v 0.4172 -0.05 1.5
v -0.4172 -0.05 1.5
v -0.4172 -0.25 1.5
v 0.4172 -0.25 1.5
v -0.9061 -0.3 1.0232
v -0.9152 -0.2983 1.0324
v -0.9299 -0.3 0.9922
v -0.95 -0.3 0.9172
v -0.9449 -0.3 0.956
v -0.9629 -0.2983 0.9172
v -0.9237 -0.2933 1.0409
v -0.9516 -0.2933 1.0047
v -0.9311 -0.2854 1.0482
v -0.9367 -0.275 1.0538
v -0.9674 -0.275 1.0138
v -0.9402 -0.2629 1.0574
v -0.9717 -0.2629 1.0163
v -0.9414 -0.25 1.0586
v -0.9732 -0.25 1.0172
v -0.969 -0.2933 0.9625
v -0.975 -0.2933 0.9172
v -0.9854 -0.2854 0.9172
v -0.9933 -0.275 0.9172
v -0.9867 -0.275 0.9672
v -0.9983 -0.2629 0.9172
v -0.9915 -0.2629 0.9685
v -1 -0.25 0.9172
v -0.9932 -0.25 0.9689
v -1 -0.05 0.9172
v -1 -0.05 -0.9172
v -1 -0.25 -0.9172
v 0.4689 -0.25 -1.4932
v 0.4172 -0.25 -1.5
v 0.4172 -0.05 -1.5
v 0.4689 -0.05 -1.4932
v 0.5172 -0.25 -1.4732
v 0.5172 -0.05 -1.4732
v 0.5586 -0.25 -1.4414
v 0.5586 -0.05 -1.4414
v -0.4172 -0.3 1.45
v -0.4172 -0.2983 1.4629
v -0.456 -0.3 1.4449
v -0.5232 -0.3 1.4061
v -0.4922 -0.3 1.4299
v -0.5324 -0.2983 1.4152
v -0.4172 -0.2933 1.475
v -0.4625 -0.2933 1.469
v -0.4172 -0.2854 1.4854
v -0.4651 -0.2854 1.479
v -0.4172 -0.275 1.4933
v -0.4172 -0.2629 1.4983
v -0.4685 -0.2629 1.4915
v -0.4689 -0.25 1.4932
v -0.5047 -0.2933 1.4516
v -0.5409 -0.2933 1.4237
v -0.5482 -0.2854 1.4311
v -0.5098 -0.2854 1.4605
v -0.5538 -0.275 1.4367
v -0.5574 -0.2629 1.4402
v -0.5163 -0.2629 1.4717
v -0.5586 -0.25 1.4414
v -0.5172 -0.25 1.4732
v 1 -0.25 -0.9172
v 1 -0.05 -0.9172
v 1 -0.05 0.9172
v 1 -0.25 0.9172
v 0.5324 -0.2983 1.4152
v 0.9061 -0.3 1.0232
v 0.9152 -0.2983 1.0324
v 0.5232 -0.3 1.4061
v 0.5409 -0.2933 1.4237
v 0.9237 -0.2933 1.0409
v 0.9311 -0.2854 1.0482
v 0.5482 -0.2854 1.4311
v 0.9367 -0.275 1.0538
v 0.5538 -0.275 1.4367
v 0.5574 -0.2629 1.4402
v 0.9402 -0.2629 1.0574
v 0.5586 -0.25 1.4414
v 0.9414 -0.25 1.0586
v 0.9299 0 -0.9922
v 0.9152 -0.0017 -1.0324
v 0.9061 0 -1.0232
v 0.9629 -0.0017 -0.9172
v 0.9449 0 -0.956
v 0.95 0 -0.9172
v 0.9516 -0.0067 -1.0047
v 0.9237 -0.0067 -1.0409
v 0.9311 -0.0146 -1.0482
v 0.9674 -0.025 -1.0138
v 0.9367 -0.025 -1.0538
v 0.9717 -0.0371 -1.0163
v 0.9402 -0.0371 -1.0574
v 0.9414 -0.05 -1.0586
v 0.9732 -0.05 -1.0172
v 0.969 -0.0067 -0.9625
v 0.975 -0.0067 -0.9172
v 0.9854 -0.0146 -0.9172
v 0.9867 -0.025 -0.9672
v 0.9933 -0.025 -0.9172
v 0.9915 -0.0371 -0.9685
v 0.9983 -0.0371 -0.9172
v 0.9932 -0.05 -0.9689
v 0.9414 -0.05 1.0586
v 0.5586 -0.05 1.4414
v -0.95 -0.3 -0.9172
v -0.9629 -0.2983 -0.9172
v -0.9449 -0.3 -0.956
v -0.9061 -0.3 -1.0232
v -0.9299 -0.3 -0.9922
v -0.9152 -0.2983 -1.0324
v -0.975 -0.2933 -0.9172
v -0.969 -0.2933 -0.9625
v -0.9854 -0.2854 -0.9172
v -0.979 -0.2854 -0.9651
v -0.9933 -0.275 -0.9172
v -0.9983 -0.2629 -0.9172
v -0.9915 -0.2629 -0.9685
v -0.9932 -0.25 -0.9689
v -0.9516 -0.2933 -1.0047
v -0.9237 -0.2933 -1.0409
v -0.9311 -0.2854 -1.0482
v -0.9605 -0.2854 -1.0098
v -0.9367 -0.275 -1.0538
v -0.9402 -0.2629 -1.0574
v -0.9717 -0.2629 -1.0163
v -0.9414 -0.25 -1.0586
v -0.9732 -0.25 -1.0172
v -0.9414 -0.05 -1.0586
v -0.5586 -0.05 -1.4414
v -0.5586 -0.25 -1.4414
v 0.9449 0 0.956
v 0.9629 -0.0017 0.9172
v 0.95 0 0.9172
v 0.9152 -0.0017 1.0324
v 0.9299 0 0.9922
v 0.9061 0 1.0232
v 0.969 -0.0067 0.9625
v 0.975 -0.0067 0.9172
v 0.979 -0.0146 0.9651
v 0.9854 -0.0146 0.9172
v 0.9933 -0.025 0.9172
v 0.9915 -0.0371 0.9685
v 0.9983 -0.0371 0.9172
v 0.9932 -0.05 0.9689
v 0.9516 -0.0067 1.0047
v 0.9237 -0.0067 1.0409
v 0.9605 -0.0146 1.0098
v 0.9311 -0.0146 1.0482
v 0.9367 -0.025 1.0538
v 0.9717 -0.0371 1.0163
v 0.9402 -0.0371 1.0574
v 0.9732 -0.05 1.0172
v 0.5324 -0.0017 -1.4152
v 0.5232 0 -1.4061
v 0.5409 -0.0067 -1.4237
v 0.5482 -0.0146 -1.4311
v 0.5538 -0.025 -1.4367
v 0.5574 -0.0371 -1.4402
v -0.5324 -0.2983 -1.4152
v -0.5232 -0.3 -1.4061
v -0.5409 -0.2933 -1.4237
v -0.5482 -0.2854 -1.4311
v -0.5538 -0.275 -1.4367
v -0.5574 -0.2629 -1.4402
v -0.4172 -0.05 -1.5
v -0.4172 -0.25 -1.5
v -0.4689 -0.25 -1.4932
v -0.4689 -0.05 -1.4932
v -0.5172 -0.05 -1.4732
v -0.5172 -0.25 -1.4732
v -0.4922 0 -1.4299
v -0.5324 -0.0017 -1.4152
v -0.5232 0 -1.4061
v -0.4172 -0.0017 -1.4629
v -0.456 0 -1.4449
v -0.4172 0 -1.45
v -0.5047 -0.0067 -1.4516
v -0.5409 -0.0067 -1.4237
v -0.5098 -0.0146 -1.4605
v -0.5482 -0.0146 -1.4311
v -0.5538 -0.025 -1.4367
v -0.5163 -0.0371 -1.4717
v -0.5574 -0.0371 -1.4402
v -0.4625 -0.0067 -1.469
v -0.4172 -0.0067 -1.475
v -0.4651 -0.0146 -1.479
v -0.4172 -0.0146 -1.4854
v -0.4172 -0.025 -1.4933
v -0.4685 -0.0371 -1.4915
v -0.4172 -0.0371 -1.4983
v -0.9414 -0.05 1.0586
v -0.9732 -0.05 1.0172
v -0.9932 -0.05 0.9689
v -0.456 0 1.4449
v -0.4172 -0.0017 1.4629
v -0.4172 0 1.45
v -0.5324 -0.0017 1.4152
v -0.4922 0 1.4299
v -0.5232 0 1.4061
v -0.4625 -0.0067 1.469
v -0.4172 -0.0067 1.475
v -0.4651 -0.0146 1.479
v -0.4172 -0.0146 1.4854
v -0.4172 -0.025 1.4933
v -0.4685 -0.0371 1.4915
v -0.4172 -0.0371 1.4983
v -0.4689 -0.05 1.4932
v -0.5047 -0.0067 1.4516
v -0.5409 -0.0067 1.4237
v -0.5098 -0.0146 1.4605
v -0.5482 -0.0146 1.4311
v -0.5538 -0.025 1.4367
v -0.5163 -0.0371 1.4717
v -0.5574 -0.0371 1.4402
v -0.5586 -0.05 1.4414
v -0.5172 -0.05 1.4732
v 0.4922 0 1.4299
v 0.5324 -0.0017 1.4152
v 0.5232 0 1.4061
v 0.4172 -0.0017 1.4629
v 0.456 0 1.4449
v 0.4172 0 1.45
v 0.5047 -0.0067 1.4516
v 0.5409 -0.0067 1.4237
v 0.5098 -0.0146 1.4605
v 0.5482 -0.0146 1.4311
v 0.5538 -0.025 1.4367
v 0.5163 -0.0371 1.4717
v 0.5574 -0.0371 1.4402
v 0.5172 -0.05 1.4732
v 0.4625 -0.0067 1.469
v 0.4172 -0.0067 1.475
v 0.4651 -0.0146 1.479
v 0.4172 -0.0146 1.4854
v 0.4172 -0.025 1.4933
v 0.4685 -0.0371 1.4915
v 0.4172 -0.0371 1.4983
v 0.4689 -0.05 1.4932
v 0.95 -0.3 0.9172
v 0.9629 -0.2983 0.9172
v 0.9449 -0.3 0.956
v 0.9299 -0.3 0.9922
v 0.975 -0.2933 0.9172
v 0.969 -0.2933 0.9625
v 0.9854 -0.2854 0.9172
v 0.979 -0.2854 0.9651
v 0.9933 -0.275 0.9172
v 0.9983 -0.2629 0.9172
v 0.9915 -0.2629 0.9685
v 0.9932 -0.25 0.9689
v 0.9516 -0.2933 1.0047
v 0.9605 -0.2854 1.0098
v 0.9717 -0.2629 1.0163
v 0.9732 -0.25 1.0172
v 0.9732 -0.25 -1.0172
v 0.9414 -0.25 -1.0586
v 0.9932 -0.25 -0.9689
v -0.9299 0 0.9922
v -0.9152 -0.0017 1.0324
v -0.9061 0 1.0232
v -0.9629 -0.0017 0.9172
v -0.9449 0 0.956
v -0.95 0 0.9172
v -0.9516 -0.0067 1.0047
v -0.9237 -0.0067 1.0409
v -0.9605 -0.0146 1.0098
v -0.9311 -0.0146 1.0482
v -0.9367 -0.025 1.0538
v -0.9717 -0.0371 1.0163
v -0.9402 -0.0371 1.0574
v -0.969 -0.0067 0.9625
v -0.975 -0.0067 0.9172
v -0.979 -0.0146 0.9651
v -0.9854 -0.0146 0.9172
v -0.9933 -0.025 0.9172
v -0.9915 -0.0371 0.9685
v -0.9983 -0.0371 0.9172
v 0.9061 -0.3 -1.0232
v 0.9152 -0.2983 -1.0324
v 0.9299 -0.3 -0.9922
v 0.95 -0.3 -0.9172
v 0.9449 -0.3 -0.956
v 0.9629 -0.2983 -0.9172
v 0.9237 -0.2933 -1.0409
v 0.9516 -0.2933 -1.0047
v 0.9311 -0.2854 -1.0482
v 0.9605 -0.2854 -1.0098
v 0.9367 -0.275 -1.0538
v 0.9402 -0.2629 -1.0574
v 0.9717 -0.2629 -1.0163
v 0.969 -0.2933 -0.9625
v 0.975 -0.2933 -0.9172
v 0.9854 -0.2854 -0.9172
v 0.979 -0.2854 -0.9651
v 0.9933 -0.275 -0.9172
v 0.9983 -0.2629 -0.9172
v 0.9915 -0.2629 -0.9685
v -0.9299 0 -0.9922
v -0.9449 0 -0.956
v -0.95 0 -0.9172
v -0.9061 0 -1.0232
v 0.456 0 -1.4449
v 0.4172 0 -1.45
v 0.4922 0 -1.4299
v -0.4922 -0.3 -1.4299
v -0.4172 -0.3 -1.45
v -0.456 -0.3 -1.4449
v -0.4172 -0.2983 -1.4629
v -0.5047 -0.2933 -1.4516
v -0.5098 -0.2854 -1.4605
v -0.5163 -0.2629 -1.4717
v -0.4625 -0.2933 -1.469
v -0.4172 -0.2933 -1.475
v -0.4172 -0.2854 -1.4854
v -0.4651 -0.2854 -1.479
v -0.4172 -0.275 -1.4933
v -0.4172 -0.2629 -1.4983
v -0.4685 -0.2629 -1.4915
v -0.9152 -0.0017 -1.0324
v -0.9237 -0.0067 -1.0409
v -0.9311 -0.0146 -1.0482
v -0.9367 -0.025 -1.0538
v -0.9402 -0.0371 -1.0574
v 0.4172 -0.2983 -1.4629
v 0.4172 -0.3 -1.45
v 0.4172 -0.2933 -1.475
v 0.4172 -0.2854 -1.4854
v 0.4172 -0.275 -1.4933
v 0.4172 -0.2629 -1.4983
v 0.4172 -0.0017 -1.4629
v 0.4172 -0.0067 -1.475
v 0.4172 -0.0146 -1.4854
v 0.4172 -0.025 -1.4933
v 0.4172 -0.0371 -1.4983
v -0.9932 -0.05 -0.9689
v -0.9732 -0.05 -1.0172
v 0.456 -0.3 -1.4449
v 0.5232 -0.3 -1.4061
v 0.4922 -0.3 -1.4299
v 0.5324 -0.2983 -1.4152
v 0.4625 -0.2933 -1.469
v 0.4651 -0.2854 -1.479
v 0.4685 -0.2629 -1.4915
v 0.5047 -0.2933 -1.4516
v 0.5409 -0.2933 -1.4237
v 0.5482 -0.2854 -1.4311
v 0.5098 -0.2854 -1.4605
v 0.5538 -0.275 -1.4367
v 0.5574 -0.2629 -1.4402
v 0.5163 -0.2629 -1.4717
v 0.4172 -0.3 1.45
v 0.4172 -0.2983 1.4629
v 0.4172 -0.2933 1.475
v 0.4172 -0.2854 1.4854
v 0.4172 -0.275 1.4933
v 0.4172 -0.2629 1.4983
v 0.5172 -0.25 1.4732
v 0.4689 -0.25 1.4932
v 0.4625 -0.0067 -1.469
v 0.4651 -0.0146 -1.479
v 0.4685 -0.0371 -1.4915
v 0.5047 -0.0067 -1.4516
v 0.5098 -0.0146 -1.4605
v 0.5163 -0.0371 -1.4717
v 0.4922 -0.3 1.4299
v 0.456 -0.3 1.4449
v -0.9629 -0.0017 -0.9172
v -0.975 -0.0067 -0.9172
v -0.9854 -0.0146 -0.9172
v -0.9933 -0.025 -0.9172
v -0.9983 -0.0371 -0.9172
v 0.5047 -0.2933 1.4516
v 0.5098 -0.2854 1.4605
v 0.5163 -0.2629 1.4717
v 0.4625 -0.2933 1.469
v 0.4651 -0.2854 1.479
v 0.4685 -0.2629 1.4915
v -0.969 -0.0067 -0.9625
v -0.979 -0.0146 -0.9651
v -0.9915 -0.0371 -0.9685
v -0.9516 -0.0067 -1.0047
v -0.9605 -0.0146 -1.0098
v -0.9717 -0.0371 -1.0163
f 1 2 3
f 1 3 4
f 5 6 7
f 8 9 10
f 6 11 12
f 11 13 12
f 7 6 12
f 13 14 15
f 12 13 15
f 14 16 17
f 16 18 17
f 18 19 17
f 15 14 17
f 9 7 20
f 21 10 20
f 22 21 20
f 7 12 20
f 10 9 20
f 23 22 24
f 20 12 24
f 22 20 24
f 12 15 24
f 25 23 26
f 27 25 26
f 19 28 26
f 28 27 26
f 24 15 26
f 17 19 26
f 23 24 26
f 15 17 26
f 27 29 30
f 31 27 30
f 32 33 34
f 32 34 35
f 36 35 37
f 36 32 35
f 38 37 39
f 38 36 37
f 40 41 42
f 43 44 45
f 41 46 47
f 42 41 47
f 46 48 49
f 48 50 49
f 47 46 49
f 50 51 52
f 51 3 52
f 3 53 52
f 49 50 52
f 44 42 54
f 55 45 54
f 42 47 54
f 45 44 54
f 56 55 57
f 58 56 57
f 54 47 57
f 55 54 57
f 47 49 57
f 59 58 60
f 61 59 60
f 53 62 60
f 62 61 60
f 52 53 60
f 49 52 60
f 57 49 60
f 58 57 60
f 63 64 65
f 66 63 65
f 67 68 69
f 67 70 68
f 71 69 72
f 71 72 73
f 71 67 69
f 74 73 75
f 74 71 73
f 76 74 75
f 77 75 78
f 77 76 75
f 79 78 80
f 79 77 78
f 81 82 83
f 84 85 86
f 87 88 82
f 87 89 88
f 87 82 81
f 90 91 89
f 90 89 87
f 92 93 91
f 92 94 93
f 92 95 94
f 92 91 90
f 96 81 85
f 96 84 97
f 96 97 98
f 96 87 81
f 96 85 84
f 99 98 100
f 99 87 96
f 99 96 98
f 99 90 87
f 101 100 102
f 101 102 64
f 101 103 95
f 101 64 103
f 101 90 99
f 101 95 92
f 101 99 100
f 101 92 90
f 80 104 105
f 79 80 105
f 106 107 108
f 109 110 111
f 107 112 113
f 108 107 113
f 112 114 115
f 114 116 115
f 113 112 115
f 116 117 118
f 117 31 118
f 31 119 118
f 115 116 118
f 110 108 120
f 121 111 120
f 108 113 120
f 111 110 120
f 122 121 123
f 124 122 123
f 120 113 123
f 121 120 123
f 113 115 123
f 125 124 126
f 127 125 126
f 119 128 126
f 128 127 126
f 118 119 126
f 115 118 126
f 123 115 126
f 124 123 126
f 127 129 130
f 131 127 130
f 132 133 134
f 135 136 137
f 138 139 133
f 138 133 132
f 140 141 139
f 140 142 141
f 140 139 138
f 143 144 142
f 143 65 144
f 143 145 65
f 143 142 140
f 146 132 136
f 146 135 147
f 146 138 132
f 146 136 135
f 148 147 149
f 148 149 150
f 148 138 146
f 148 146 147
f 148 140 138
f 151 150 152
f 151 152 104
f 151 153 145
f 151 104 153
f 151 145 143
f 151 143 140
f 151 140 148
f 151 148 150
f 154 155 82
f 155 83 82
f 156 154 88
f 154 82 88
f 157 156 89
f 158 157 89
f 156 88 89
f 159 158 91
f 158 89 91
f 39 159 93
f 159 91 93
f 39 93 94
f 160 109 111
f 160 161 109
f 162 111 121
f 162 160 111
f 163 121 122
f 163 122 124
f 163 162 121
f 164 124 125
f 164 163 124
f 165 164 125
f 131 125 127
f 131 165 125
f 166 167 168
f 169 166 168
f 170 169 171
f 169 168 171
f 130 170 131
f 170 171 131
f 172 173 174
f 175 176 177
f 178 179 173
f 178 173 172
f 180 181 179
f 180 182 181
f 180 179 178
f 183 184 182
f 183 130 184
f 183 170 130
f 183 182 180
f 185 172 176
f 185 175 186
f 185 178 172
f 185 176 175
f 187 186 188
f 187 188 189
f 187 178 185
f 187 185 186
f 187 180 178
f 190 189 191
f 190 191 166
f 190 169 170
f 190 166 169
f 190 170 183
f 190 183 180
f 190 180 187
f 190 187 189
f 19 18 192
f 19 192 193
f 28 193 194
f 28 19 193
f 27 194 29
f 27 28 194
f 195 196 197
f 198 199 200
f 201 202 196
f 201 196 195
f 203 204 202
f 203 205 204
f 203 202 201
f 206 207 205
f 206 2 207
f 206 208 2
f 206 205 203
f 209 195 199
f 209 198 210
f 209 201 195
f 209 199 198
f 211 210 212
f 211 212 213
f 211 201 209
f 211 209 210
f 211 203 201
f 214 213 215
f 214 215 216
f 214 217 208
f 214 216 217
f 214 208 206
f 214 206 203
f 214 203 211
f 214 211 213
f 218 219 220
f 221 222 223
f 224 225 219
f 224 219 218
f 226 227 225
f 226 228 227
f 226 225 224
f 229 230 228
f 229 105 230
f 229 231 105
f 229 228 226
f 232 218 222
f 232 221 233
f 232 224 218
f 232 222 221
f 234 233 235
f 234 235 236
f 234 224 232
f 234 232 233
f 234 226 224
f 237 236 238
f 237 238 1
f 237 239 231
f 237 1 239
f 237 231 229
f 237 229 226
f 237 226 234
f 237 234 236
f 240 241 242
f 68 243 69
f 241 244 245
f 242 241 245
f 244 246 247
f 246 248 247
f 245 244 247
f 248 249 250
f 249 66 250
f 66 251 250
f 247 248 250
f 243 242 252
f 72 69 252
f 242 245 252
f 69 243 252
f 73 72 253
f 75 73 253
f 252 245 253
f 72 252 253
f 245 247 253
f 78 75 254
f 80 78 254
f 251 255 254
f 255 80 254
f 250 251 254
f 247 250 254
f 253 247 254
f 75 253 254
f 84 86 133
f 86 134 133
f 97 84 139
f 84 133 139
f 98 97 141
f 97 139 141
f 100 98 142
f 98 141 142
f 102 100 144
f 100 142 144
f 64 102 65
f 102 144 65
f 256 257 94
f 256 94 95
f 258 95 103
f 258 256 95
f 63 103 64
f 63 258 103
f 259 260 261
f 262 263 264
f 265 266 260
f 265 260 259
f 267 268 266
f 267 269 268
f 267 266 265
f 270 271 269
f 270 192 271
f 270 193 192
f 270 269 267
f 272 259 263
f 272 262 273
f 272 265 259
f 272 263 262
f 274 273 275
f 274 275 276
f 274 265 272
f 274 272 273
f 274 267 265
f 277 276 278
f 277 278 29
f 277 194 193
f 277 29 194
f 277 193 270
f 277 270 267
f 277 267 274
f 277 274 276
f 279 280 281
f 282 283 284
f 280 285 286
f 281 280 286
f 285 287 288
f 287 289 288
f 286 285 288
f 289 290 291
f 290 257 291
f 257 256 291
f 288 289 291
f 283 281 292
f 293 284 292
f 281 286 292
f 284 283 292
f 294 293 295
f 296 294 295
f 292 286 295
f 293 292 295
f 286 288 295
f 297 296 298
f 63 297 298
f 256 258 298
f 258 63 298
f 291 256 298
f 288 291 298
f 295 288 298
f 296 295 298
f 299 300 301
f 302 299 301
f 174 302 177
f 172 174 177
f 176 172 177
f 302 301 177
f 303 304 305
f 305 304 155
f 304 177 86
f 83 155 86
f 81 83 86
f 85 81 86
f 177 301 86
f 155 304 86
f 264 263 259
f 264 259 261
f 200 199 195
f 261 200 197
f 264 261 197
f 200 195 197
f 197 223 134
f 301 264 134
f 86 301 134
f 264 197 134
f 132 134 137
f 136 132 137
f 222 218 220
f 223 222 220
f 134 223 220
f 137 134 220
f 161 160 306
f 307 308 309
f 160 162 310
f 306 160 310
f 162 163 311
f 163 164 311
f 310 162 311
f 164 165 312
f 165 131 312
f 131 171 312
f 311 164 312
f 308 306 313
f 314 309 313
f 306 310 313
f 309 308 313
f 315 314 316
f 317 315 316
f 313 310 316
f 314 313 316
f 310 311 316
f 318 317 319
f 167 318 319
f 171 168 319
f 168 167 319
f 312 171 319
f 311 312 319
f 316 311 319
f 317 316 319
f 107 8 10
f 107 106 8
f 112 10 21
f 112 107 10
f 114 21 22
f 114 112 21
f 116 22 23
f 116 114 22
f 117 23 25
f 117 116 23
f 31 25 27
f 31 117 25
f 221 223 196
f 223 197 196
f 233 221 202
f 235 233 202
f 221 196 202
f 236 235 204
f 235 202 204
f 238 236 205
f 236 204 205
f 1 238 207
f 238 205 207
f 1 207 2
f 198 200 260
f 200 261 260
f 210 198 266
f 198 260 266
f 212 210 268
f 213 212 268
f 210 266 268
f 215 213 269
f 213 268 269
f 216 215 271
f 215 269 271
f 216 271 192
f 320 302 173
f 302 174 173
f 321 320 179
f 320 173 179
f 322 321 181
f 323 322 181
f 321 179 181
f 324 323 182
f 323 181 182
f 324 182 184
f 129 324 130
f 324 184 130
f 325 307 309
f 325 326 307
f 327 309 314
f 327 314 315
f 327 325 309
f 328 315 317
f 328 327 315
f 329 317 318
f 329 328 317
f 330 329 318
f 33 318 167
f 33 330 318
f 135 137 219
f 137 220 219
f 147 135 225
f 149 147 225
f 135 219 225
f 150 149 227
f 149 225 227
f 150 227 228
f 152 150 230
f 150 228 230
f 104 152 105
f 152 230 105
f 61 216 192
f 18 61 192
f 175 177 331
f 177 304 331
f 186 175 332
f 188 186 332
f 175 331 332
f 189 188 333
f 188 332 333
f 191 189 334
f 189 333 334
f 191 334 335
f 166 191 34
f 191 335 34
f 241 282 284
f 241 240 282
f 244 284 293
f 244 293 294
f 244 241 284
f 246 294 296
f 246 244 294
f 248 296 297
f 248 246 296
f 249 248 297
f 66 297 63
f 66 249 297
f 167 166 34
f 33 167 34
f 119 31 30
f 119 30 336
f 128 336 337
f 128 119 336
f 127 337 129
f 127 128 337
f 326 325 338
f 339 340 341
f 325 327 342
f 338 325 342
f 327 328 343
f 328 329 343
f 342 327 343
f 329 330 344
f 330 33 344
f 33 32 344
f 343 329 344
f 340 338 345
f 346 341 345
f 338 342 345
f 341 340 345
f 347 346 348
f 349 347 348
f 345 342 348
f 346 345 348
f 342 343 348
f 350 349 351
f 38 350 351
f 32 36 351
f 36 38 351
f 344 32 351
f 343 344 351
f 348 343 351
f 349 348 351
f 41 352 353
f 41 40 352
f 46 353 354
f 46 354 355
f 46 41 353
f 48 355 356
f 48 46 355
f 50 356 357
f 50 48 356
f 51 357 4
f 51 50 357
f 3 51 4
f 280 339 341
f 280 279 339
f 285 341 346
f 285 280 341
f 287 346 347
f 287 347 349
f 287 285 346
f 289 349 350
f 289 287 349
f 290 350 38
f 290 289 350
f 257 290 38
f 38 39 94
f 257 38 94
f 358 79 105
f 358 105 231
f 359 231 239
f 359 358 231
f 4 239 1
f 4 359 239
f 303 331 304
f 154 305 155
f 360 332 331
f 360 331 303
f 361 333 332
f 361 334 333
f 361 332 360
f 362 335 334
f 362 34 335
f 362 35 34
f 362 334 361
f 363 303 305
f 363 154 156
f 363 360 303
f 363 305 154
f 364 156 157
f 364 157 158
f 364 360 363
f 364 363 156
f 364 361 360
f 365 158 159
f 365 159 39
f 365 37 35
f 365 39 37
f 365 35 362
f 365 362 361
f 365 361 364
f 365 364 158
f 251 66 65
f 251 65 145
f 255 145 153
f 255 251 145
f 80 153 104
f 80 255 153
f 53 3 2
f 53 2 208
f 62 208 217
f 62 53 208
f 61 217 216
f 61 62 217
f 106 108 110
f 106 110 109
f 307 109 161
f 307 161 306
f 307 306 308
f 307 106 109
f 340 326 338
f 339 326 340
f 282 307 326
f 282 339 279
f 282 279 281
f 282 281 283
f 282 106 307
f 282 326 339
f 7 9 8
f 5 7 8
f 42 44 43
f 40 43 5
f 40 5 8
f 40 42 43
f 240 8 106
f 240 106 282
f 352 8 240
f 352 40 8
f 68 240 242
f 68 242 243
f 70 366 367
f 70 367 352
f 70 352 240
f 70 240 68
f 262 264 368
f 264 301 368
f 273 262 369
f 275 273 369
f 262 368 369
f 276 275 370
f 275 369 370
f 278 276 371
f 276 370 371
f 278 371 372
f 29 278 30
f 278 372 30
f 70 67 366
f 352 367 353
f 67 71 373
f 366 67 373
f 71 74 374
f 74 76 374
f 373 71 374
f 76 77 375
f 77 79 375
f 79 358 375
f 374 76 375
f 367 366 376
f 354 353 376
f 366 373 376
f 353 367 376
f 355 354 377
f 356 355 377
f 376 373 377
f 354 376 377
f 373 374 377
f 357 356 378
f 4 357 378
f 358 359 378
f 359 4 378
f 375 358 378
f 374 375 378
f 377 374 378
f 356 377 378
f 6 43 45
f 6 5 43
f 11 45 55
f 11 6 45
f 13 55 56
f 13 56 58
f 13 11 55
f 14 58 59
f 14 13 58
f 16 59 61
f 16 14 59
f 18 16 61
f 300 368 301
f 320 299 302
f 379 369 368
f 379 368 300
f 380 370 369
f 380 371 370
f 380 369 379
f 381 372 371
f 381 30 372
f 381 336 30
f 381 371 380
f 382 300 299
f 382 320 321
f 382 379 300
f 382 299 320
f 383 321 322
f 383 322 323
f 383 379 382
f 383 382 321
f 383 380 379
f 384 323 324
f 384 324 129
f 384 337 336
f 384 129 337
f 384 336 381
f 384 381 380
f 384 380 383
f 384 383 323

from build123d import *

# Parameters (mm, degrees)
F0_W     = 1
F0_H     = 3
F1_DEPTH = 0.3
F2_R     = 0.2
F3_R     = 0.05


with BuildPart() as f1:
    # F0 (on Front) → F1 (new body)
    with BuildSketch(Plane.XZ):
        Rectangle(F0_W, F0_H)
        Polygon((1, 1), (0.5, 1.5), (0.5, -1.5), (1, -1), align=None)
        Polygon((-0.5, -1.5), (-0.5, 1.5), (-1, 1), (-1, -1), align=None)
    extrude(amount=F1_DEPTH)

    # F2
    f2_edges = [f1.edges().sort_by_distance(p)[0] for p in [
        (0.5, -0.15, 1.5),
        (1, -0.15, 1),
        (-0.5, -0.15, 1.5),
        (-1, -0.15, 1),
        (-1, -0.15, -1),
        (-0.5, -0.15, -1.5),
        (0.5, -0.15, -1.5),
        (1, -0.15, -1),
    ]]
    fillet(f2_edges, radius=F2_R)

    # F3
    f3_edges = [f1.edges().sort_by_distance(p)[0] for p in [
        (1, 0, 0),
        (-1, -0.3, 0),
    ]]
    fillet(f3_edges, radius=F3_R)


solid = f1.part
